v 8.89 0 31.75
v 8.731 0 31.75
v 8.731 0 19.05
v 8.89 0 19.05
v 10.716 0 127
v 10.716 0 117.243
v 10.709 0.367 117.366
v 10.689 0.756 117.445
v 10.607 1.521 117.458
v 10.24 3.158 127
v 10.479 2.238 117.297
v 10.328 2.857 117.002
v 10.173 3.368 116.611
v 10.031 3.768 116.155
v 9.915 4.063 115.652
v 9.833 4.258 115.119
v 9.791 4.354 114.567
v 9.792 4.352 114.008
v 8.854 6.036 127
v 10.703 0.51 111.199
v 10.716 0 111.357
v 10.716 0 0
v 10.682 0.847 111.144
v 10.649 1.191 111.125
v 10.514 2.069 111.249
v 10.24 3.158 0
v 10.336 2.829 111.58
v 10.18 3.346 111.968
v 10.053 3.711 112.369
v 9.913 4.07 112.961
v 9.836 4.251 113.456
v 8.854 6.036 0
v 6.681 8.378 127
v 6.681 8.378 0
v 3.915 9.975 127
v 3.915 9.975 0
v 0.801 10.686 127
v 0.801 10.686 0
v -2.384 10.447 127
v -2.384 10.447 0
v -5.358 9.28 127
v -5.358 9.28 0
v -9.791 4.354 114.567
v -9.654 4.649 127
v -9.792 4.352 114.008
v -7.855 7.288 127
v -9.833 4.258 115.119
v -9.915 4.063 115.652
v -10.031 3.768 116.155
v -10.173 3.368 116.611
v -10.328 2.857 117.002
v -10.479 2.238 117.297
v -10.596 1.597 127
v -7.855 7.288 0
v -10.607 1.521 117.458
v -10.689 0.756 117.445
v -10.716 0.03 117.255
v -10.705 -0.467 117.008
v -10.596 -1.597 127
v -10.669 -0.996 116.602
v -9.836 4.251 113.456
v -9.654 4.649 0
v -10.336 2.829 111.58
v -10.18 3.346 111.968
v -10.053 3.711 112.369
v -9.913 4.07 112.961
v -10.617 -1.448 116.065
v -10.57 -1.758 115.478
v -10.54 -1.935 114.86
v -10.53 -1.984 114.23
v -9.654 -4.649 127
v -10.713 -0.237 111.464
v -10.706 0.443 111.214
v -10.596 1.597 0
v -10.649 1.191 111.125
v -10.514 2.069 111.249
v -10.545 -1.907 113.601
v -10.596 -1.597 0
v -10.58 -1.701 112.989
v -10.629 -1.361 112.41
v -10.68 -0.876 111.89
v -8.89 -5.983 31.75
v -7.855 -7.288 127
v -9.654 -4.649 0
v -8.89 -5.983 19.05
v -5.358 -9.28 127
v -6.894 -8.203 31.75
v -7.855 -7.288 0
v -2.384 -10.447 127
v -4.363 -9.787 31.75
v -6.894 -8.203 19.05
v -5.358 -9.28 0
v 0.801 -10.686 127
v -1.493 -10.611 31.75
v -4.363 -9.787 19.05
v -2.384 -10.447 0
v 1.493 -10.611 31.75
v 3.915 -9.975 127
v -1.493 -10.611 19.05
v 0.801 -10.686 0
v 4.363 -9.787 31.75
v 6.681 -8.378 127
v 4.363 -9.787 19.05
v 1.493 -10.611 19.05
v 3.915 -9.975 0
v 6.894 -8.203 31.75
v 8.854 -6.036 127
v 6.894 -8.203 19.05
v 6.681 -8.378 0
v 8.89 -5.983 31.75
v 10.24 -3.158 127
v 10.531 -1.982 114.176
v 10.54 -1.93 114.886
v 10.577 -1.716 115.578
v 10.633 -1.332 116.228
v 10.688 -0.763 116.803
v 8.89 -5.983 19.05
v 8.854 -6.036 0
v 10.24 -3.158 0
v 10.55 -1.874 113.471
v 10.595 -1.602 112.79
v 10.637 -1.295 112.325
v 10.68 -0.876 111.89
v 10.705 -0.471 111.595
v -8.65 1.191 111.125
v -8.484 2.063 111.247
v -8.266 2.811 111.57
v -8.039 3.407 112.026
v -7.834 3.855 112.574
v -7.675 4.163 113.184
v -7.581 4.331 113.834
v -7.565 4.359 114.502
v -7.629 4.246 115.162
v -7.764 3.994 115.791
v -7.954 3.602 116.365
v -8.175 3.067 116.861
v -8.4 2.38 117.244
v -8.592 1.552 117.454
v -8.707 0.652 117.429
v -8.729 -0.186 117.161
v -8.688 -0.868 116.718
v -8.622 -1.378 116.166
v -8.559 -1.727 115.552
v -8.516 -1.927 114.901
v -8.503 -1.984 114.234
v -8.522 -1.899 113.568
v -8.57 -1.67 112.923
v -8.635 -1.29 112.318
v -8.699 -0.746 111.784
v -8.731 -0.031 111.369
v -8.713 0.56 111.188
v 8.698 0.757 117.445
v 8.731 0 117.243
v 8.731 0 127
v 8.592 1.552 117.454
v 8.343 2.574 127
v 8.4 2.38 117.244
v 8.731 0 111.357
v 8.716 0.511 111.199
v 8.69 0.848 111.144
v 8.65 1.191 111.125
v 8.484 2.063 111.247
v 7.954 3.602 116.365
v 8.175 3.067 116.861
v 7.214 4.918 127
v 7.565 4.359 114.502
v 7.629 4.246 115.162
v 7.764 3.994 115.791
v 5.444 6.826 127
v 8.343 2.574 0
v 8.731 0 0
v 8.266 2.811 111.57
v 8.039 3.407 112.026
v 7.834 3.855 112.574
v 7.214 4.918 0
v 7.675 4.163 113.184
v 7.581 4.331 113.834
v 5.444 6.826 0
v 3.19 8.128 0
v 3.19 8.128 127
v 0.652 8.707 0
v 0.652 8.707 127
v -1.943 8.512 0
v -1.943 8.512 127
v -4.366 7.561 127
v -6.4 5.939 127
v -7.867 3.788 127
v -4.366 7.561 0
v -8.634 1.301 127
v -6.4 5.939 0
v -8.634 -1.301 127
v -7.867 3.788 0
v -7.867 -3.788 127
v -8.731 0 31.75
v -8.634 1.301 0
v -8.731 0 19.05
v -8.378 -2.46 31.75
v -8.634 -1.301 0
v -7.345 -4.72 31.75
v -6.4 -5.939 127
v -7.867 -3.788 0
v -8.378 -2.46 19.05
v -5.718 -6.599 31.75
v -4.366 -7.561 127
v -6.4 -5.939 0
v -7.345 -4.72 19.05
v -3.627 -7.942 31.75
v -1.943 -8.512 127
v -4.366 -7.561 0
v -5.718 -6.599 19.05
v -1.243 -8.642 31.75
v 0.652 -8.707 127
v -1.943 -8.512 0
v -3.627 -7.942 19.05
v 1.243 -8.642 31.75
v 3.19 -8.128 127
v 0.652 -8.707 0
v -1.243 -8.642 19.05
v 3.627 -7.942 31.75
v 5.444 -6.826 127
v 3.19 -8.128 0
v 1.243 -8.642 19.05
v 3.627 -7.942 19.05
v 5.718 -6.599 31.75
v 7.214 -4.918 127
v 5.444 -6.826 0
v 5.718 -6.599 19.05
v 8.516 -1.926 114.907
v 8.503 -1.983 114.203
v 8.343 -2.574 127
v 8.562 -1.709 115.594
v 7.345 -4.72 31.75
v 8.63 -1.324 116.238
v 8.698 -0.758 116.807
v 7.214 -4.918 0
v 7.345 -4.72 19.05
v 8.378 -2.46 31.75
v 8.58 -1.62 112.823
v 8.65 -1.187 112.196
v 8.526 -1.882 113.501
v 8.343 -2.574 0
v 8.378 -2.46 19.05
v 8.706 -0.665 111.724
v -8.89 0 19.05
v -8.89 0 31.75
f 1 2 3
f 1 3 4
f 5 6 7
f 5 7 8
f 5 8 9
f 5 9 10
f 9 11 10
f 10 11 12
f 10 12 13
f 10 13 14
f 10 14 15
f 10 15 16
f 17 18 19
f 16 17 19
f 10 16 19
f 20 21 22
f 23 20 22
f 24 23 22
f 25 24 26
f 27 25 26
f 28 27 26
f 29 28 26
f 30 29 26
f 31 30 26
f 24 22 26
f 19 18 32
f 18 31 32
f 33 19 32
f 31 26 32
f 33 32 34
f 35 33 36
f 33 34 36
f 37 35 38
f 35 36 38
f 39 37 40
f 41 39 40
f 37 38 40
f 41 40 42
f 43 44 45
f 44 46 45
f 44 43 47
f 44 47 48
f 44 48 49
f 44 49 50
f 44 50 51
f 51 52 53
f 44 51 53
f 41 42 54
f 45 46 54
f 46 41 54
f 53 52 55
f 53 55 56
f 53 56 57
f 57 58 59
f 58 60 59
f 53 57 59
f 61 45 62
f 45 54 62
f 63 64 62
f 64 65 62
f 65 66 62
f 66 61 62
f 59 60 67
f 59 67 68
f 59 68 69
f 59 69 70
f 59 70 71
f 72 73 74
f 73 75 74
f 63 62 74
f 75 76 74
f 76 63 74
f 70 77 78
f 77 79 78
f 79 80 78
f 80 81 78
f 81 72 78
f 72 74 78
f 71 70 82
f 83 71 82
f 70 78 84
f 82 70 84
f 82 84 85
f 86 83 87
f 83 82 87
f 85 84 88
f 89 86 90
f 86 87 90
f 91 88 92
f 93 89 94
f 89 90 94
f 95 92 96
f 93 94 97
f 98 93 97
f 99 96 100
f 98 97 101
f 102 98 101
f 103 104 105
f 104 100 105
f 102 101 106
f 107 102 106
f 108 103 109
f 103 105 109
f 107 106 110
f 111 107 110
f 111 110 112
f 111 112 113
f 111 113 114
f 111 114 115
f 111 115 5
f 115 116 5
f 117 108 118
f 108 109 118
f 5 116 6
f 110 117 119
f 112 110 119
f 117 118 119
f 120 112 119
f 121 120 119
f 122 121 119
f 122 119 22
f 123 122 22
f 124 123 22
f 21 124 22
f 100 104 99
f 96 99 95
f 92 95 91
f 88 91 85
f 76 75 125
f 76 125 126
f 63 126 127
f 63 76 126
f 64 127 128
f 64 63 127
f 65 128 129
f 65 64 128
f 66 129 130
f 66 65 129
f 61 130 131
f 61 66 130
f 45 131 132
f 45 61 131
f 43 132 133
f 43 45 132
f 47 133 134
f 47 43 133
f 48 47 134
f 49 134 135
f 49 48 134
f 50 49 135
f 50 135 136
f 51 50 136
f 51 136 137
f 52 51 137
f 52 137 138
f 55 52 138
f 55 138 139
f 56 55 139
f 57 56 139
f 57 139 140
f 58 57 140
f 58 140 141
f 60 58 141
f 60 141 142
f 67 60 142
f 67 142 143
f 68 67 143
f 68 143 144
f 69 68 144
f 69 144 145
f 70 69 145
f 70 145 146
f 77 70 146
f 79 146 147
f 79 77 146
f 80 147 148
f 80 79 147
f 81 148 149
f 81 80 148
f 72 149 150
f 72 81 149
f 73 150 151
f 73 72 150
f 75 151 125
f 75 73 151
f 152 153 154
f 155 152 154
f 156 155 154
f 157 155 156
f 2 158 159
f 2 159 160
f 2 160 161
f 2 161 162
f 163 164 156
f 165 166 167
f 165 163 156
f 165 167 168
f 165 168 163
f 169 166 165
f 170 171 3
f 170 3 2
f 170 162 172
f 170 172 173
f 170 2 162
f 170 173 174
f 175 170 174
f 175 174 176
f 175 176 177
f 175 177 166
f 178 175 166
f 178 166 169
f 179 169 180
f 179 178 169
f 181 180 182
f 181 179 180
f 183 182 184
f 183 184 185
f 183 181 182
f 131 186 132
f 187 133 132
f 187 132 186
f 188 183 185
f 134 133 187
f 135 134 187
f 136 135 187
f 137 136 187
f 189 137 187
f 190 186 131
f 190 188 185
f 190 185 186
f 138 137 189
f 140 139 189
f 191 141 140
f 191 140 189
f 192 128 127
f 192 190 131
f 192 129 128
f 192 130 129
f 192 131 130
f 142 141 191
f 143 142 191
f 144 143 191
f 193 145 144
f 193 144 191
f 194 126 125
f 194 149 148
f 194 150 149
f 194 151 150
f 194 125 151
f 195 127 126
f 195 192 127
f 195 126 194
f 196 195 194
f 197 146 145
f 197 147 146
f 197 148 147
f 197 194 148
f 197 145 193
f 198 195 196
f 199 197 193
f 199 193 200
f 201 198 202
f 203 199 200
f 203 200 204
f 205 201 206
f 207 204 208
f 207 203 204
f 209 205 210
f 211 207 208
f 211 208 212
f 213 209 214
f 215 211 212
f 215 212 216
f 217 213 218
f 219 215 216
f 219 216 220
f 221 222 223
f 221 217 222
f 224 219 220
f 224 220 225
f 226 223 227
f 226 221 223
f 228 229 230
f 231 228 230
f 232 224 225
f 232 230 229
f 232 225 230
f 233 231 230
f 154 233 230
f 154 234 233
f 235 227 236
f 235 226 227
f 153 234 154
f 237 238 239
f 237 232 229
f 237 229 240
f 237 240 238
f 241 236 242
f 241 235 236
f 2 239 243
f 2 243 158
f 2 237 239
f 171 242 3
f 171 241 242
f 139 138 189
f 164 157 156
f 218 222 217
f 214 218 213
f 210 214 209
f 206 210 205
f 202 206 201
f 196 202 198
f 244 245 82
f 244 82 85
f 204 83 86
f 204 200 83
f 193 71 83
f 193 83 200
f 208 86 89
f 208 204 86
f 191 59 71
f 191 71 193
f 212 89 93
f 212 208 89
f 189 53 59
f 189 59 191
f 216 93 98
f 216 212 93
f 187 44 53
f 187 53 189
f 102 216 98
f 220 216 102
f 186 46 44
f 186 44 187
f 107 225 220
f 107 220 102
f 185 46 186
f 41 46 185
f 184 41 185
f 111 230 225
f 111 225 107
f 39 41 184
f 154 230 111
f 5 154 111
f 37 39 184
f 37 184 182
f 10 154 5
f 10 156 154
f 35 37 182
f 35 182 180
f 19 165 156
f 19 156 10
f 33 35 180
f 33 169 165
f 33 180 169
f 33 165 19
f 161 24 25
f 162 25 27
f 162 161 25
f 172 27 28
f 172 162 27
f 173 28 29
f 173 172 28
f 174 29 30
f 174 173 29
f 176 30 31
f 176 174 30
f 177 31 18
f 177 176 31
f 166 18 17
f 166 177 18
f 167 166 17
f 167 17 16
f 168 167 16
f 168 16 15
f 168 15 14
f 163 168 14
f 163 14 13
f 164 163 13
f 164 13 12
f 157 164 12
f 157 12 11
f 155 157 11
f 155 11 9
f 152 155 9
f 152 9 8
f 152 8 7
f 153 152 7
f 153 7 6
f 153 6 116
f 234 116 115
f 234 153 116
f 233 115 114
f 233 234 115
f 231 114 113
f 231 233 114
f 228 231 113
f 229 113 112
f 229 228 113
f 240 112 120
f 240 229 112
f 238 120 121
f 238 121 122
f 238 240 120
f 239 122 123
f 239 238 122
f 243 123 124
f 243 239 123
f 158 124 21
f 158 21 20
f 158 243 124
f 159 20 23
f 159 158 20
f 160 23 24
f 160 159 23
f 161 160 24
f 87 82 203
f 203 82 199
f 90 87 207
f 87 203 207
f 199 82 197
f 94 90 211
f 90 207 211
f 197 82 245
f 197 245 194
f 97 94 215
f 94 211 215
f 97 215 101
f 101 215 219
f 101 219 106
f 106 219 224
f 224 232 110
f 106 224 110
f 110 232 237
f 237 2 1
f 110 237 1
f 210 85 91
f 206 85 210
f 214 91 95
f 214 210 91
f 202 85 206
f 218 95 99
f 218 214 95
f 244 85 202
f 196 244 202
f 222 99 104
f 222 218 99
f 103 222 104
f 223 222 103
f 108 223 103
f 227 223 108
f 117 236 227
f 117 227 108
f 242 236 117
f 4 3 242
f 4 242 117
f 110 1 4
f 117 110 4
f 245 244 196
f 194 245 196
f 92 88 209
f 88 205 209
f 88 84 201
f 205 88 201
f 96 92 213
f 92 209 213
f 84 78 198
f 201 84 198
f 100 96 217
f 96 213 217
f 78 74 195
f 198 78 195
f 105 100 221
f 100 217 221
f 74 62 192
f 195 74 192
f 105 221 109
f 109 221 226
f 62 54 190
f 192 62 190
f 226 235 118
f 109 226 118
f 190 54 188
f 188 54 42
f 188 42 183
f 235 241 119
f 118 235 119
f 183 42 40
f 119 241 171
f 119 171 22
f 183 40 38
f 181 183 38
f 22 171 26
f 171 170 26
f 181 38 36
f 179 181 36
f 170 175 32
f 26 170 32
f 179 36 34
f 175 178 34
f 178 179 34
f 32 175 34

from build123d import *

# Parameters (mm, degrees)
SKETCH1_R               = 10.715625
SKETCH1_R_2             = 8.73125
BOSS_EXTRUDE1_DEPTH     = 127
SKETCH2_W               = 17.78
SKETCH2_H               = 12.7
CUT_EXTRUDE1_DEPTH      = 128.900935252
CUT_EXTRUDE2_DEPTH      = 128.900935252
CUT_EXTRUDE2_DEPTH_BACK = 128.900935252
SKETCH5_R               = 3.175


with BuildPart() as part:
    # Sketch1 → Boss-Extrude1 (new body)
    with BuildSketch(Plane.XY):
        Circle(SKETCH1_R)
        Circle(SKETCH1_R_2, mode=Mode.SUBTRACT)
    extrude(amount=BOSS_EXTRUDE1_DEPTH)

    # Sketch2 → Cut-Extrude1 (cut, through all)
    with BuildSketch(Plane(origin=(0, 0, 0), x_dir=(1, 0, 0), z_dir=(0, 1, 0))):
        with Locations((0, -25.4)):
            Rectangle(SKETCH2_W, SKETCH2_H)
    extrude(amount=-CUT_EXTRUDE1_DEPTH, mode=Mode.SUBTRACT)

    # Sketch5 → Cut-Extrude2 (cut, two sides: drawn at the far end of the back side and taken through both)
    with BuildSketch(Plane(origin=(0, 0, 0), x_dir=(0, 0, -1), z_dir=(1, 0, 0)).offset(-CUT_EXTRUDE2_DEPTH_BACK)):
        with Locations((-114.3, 1.190625)):
            Circle(SKETCH5_R)
    extrude(amount=CUT_EXTRUDE2_DEPTH + CUT_EXTRUDE2_DEPTH_BACK, mode=Mode.SUBTRACT)


solid = part.part
